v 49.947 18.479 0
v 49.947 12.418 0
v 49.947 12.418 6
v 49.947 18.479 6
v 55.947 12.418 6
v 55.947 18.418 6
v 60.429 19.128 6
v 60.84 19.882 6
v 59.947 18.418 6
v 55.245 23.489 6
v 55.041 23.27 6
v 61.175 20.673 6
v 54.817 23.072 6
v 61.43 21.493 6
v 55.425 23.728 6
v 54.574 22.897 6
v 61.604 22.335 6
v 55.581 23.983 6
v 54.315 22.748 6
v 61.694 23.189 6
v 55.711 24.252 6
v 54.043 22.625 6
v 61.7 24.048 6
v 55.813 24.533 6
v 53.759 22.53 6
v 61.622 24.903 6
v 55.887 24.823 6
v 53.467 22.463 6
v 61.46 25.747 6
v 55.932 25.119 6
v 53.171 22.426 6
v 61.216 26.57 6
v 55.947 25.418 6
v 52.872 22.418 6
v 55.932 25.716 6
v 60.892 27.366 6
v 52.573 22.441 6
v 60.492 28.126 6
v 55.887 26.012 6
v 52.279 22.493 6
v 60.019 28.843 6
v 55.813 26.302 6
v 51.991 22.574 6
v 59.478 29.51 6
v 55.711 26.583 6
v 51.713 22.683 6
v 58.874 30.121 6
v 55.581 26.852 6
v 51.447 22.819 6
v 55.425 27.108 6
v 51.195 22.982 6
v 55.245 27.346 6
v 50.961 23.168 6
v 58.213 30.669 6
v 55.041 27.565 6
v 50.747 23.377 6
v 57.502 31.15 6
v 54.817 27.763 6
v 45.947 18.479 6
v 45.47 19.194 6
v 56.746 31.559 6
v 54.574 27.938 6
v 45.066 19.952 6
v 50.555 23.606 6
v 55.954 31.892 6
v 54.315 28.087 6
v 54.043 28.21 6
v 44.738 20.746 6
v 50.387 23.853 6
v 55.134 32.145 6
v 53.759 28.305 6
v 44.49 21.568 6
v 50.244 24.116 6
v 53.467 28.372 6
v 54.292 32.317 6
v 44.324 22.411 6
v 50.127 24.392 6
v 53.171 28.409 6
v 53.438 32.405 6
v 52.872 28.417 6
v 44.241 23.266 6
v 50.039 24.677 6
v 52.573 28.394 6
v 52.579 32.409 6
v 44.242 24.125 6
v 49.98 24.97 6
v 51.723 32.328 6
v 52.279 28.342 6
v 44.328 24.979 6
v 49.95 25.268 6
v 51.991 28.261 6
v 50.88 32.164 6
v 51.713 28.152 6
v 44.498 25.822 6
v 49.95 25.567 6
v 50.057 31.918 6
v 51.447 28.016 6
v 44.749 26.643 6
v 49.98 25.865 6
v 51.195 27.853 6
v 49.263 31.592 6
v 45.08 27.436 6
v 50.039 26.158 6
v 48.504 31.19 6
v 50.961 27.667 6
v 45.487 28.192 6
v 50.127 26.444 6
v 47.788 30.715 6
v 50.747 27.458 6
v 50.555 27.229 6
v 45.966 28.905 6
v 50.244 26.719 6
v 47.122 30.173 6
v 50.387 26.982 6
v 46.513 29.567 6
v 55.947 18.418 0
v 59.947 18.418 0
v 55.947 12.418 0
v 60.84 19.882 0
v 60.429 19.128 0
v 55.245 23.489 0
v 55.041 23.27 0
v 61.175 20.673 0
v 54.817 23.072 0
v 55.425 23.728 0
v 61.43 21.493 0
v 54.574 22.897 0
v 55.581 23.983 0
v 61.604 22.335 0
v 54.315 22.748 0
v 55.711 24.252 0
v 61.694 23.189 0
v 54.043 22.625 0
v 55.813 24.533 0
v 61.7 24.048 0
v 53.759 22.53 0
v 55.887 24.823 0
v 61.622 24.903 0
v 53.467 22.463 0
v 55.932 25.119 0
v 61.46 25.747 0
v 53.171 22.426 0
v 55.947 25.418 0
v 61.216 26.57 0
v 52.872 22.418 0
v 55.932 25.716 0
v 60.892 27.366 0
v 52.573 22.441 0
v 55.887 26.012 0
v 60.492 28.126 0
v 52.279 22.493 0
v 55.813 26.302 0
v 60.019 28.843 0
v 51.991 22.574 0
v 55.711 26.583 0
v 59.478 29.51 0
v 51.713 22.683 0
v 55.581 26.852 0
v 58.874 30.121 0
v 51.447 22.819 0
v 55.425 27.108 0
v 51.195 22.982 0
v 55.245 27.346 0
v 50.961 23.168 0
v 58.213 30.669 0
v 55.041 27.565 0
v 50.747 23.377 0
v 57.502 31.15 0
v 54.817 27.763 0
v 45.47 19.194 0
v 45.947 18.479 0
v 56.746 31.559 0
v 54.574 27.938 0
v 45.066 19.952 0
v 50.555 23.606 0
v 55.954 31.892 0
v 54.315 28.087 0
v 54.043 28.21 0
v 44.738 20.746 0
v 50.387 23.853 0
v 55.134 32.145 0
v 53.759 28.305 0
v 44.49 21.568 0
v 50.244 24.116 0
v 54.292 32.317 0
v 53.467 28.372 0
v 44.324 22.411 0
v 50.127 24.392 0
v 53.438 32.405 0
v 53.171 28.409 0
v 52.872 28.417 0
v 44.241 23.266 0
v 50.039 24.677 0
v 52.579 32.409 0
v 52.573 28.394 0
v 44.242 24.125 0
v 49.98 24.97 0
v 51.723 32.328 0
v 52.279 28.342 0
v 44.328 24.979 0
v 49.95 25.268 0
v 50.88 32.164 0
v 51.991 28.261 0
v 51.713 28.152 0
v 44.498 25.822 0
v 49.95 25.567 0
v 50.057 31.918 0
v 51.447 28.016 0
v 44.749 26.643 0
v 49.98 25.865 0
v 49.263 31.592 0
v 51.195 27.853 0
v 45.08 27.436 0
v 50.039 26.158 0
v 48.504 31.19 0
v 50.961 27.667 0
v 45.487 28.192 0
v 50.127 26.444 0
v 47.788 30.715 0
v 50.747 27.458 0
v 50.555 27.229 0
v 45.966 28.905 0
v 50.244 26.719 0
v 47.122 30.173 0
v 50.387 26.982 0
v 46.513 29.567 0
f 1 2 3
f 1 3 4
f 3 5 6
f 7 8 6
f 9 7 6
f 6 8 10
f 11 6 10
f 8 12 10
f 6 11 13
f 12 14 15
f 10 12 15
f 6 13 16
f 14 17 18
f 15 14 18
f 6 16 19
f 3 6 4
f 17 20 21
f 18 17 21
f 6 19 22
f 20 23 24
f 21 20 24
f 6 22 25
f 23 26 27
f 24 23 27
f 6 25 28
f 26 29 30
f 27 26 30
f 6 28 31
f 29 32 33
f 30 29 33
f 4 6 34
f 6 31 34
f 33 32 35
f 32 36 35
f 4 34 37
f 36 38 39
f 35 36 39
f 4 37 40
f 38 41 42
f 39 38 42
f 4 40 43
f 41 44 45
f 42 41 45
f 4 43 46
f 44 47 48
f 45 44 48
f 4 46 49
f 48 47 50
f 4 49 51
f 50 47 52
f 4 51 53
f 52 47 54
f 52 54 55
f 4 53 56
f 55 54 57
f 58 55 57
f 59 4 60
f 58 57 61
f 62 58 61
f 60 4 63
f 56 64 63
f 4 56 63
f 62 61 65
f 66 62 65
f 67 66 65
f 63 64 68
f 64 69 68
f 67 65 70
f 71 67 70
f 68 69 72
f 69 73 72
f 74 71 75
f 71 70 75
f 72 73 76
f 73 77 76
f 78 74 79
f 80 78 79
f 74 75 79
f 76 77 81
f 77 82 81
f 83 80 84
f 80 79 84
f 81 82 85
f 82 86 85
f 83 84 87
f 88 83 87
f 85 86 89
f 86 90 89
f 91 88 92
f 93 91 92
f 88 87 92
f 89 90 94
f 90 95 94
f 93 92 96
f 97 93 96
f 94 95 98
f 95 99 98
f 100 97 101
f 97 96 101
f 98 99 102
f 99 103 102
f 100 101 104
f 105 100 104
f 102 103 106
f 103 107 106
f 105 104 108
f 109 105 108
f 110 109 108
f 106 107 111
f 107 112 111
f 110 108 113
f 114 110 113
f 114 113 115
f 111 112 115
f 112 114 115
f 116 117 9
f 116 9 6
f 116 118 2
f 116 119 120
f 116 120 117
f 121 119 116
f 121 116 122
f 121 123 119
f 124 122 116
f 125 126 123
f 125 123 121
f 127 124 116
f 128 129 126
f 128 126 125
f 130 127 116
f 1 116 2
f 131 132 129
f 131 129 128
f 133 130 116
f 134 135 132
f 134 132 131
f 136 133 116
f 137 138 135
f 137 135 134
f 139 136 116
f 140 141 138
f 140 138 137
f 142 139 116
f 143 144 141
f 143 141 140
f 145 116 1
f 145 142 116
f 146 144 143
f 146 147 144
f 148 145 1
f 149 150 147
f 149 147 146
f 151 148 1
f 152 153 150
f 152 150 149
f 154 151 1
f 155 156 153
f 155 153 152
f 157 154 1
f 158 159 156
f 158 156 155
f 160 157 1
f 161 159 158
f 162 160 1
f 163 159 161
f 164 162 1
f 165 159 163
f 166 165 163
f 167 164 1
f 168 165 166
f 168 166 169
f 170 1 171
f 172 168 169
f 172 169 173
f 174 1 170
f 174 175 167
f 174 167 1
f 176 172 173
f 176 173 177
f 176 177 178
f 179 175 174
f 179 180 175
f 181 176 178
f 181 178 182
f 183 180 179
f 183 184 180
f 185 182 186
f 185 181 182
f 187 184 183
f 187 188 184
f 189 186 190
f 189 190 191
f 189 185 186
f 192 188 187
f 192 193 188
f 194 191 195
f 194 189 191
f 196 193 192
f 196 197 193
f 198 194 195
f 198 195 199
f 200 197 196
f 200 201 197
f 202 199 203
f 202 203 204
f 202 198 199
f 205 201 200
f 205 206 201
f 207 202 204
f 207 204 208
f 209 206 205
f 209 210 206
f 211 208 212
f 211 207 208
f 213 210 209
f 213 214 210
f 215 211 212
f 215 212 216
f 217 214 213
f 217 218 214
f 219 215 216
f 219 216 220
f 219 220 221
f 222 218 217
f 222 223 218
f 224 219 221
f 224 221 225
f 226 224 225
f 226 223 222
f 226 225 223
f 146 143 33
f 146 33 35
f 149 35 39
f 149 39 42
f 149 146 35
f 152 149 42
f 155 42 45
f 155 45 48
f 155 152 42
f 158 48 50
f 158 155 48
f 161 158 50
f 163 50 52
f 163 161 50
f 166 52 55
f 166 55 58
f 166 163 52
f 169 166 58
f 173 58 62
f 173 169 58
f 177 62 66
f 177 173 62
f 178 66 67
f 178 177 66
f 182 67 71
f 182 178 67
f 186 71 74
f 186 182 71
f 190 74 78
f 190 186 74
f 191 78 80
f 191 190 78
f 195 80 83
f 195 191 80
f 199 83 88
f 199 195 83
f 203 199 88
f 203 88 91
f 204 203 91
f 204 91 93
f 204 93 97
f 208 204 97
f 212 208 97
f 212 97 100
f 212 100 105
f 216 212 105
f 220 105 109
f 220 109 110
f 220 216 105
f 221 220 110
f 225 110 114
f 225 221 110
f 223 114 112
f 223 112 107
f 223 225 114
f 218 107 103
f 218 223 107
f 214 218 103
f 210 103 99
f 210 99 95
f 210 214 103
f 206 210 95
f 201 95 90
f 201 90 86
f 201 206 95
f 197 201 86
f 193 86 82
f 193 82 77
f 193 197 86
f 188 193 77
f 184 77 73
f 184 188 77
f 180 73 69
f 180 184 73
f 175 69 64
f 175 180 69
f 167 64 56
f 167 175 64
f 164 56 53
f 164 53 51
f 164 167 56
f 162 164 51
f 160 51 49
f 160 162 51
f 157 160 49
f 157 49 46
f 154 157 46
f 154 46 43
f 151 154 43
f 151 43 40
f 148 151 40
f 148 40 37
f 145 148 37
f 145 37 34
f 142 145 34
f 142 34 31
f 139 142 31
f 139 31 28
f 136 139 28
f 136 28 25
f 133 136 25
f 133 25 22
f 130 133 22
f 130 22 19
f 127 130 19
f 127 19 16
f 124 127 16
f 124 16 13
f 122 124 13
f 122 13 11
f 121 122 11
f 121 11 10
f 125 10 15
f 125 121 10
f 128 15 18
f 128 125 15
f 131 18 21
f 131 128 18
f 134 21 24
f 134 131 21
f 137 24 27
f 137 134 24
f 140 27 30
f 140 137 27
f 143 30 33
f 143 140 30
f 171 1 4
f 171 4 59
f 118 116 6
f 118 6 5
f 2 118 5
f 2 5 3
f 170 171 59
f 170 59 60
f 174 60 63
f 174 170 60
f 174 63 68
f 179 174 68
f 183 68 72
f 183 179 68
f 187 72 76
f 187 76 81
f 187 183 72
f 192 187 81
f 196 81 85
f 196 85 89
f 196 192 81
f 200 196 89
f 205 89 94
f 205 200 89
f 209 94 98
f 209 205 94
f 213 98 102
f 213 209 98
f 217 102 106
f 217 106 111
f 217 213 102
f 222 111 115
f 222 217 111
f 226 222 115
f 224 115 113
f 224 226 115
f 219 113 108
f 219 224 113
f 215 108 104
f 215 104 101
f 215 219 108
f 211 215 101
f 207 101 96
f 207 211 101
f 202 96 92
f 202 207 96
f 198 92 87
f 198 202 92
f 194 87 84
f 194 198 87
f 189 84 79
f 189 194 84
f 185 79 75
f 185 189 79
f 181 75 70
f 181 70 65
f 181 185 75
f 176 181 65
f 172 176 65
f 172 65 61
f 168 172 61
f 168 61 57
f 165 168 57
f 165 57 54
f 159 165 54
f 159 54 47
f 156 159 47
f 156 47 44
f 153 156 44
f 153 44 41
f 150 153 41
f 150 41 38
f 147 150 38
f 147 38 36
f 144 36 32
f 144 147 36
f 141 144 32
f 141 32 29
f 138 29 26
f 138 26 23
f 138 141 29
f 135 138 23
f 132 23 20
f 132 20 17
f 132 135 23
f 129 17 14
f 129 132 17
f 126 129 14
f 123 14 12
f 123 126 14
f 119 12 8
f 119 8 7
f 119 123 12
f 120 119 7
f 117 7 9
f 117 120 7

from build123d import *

# Parameters (mm, degrees)
MODEL_R             = 3
BOSS_EXTRUDE1_DEPTH = 6


with BuildPart() as part:
    # Model → Boss-Extrude1 (new body)
    with BuildSketch(Plane.XY):
        with BuildLine():
            Line((55.946512191, 18.417561913), (55.946512191, 12.417561913))
            Line((55.946512191, 12.417561913), (49.946512191, 12.417561913))
            Line((49.946512191, 12.417561913), (49.946512191, 18.479362937))
            Line((49.946512191, 18.479362937), (45.946512191, 18.479362937))
            ThreePointArc((45.946512191, 18.479362937), (53.008176567, 32.417507278), (59.946512191, 18.417561913))
            Line((59.946512191, 18.417561913), (55.946512191, 18.417561913))
        make_face()
        with Locations((52.946512191, 25.417561913)):
            Circle(MODEL_R, mode=Mode.SUBTRACT)
    extrude(amount=BOSS_EXTRUDE1_DEPTH)


solid = part.part
